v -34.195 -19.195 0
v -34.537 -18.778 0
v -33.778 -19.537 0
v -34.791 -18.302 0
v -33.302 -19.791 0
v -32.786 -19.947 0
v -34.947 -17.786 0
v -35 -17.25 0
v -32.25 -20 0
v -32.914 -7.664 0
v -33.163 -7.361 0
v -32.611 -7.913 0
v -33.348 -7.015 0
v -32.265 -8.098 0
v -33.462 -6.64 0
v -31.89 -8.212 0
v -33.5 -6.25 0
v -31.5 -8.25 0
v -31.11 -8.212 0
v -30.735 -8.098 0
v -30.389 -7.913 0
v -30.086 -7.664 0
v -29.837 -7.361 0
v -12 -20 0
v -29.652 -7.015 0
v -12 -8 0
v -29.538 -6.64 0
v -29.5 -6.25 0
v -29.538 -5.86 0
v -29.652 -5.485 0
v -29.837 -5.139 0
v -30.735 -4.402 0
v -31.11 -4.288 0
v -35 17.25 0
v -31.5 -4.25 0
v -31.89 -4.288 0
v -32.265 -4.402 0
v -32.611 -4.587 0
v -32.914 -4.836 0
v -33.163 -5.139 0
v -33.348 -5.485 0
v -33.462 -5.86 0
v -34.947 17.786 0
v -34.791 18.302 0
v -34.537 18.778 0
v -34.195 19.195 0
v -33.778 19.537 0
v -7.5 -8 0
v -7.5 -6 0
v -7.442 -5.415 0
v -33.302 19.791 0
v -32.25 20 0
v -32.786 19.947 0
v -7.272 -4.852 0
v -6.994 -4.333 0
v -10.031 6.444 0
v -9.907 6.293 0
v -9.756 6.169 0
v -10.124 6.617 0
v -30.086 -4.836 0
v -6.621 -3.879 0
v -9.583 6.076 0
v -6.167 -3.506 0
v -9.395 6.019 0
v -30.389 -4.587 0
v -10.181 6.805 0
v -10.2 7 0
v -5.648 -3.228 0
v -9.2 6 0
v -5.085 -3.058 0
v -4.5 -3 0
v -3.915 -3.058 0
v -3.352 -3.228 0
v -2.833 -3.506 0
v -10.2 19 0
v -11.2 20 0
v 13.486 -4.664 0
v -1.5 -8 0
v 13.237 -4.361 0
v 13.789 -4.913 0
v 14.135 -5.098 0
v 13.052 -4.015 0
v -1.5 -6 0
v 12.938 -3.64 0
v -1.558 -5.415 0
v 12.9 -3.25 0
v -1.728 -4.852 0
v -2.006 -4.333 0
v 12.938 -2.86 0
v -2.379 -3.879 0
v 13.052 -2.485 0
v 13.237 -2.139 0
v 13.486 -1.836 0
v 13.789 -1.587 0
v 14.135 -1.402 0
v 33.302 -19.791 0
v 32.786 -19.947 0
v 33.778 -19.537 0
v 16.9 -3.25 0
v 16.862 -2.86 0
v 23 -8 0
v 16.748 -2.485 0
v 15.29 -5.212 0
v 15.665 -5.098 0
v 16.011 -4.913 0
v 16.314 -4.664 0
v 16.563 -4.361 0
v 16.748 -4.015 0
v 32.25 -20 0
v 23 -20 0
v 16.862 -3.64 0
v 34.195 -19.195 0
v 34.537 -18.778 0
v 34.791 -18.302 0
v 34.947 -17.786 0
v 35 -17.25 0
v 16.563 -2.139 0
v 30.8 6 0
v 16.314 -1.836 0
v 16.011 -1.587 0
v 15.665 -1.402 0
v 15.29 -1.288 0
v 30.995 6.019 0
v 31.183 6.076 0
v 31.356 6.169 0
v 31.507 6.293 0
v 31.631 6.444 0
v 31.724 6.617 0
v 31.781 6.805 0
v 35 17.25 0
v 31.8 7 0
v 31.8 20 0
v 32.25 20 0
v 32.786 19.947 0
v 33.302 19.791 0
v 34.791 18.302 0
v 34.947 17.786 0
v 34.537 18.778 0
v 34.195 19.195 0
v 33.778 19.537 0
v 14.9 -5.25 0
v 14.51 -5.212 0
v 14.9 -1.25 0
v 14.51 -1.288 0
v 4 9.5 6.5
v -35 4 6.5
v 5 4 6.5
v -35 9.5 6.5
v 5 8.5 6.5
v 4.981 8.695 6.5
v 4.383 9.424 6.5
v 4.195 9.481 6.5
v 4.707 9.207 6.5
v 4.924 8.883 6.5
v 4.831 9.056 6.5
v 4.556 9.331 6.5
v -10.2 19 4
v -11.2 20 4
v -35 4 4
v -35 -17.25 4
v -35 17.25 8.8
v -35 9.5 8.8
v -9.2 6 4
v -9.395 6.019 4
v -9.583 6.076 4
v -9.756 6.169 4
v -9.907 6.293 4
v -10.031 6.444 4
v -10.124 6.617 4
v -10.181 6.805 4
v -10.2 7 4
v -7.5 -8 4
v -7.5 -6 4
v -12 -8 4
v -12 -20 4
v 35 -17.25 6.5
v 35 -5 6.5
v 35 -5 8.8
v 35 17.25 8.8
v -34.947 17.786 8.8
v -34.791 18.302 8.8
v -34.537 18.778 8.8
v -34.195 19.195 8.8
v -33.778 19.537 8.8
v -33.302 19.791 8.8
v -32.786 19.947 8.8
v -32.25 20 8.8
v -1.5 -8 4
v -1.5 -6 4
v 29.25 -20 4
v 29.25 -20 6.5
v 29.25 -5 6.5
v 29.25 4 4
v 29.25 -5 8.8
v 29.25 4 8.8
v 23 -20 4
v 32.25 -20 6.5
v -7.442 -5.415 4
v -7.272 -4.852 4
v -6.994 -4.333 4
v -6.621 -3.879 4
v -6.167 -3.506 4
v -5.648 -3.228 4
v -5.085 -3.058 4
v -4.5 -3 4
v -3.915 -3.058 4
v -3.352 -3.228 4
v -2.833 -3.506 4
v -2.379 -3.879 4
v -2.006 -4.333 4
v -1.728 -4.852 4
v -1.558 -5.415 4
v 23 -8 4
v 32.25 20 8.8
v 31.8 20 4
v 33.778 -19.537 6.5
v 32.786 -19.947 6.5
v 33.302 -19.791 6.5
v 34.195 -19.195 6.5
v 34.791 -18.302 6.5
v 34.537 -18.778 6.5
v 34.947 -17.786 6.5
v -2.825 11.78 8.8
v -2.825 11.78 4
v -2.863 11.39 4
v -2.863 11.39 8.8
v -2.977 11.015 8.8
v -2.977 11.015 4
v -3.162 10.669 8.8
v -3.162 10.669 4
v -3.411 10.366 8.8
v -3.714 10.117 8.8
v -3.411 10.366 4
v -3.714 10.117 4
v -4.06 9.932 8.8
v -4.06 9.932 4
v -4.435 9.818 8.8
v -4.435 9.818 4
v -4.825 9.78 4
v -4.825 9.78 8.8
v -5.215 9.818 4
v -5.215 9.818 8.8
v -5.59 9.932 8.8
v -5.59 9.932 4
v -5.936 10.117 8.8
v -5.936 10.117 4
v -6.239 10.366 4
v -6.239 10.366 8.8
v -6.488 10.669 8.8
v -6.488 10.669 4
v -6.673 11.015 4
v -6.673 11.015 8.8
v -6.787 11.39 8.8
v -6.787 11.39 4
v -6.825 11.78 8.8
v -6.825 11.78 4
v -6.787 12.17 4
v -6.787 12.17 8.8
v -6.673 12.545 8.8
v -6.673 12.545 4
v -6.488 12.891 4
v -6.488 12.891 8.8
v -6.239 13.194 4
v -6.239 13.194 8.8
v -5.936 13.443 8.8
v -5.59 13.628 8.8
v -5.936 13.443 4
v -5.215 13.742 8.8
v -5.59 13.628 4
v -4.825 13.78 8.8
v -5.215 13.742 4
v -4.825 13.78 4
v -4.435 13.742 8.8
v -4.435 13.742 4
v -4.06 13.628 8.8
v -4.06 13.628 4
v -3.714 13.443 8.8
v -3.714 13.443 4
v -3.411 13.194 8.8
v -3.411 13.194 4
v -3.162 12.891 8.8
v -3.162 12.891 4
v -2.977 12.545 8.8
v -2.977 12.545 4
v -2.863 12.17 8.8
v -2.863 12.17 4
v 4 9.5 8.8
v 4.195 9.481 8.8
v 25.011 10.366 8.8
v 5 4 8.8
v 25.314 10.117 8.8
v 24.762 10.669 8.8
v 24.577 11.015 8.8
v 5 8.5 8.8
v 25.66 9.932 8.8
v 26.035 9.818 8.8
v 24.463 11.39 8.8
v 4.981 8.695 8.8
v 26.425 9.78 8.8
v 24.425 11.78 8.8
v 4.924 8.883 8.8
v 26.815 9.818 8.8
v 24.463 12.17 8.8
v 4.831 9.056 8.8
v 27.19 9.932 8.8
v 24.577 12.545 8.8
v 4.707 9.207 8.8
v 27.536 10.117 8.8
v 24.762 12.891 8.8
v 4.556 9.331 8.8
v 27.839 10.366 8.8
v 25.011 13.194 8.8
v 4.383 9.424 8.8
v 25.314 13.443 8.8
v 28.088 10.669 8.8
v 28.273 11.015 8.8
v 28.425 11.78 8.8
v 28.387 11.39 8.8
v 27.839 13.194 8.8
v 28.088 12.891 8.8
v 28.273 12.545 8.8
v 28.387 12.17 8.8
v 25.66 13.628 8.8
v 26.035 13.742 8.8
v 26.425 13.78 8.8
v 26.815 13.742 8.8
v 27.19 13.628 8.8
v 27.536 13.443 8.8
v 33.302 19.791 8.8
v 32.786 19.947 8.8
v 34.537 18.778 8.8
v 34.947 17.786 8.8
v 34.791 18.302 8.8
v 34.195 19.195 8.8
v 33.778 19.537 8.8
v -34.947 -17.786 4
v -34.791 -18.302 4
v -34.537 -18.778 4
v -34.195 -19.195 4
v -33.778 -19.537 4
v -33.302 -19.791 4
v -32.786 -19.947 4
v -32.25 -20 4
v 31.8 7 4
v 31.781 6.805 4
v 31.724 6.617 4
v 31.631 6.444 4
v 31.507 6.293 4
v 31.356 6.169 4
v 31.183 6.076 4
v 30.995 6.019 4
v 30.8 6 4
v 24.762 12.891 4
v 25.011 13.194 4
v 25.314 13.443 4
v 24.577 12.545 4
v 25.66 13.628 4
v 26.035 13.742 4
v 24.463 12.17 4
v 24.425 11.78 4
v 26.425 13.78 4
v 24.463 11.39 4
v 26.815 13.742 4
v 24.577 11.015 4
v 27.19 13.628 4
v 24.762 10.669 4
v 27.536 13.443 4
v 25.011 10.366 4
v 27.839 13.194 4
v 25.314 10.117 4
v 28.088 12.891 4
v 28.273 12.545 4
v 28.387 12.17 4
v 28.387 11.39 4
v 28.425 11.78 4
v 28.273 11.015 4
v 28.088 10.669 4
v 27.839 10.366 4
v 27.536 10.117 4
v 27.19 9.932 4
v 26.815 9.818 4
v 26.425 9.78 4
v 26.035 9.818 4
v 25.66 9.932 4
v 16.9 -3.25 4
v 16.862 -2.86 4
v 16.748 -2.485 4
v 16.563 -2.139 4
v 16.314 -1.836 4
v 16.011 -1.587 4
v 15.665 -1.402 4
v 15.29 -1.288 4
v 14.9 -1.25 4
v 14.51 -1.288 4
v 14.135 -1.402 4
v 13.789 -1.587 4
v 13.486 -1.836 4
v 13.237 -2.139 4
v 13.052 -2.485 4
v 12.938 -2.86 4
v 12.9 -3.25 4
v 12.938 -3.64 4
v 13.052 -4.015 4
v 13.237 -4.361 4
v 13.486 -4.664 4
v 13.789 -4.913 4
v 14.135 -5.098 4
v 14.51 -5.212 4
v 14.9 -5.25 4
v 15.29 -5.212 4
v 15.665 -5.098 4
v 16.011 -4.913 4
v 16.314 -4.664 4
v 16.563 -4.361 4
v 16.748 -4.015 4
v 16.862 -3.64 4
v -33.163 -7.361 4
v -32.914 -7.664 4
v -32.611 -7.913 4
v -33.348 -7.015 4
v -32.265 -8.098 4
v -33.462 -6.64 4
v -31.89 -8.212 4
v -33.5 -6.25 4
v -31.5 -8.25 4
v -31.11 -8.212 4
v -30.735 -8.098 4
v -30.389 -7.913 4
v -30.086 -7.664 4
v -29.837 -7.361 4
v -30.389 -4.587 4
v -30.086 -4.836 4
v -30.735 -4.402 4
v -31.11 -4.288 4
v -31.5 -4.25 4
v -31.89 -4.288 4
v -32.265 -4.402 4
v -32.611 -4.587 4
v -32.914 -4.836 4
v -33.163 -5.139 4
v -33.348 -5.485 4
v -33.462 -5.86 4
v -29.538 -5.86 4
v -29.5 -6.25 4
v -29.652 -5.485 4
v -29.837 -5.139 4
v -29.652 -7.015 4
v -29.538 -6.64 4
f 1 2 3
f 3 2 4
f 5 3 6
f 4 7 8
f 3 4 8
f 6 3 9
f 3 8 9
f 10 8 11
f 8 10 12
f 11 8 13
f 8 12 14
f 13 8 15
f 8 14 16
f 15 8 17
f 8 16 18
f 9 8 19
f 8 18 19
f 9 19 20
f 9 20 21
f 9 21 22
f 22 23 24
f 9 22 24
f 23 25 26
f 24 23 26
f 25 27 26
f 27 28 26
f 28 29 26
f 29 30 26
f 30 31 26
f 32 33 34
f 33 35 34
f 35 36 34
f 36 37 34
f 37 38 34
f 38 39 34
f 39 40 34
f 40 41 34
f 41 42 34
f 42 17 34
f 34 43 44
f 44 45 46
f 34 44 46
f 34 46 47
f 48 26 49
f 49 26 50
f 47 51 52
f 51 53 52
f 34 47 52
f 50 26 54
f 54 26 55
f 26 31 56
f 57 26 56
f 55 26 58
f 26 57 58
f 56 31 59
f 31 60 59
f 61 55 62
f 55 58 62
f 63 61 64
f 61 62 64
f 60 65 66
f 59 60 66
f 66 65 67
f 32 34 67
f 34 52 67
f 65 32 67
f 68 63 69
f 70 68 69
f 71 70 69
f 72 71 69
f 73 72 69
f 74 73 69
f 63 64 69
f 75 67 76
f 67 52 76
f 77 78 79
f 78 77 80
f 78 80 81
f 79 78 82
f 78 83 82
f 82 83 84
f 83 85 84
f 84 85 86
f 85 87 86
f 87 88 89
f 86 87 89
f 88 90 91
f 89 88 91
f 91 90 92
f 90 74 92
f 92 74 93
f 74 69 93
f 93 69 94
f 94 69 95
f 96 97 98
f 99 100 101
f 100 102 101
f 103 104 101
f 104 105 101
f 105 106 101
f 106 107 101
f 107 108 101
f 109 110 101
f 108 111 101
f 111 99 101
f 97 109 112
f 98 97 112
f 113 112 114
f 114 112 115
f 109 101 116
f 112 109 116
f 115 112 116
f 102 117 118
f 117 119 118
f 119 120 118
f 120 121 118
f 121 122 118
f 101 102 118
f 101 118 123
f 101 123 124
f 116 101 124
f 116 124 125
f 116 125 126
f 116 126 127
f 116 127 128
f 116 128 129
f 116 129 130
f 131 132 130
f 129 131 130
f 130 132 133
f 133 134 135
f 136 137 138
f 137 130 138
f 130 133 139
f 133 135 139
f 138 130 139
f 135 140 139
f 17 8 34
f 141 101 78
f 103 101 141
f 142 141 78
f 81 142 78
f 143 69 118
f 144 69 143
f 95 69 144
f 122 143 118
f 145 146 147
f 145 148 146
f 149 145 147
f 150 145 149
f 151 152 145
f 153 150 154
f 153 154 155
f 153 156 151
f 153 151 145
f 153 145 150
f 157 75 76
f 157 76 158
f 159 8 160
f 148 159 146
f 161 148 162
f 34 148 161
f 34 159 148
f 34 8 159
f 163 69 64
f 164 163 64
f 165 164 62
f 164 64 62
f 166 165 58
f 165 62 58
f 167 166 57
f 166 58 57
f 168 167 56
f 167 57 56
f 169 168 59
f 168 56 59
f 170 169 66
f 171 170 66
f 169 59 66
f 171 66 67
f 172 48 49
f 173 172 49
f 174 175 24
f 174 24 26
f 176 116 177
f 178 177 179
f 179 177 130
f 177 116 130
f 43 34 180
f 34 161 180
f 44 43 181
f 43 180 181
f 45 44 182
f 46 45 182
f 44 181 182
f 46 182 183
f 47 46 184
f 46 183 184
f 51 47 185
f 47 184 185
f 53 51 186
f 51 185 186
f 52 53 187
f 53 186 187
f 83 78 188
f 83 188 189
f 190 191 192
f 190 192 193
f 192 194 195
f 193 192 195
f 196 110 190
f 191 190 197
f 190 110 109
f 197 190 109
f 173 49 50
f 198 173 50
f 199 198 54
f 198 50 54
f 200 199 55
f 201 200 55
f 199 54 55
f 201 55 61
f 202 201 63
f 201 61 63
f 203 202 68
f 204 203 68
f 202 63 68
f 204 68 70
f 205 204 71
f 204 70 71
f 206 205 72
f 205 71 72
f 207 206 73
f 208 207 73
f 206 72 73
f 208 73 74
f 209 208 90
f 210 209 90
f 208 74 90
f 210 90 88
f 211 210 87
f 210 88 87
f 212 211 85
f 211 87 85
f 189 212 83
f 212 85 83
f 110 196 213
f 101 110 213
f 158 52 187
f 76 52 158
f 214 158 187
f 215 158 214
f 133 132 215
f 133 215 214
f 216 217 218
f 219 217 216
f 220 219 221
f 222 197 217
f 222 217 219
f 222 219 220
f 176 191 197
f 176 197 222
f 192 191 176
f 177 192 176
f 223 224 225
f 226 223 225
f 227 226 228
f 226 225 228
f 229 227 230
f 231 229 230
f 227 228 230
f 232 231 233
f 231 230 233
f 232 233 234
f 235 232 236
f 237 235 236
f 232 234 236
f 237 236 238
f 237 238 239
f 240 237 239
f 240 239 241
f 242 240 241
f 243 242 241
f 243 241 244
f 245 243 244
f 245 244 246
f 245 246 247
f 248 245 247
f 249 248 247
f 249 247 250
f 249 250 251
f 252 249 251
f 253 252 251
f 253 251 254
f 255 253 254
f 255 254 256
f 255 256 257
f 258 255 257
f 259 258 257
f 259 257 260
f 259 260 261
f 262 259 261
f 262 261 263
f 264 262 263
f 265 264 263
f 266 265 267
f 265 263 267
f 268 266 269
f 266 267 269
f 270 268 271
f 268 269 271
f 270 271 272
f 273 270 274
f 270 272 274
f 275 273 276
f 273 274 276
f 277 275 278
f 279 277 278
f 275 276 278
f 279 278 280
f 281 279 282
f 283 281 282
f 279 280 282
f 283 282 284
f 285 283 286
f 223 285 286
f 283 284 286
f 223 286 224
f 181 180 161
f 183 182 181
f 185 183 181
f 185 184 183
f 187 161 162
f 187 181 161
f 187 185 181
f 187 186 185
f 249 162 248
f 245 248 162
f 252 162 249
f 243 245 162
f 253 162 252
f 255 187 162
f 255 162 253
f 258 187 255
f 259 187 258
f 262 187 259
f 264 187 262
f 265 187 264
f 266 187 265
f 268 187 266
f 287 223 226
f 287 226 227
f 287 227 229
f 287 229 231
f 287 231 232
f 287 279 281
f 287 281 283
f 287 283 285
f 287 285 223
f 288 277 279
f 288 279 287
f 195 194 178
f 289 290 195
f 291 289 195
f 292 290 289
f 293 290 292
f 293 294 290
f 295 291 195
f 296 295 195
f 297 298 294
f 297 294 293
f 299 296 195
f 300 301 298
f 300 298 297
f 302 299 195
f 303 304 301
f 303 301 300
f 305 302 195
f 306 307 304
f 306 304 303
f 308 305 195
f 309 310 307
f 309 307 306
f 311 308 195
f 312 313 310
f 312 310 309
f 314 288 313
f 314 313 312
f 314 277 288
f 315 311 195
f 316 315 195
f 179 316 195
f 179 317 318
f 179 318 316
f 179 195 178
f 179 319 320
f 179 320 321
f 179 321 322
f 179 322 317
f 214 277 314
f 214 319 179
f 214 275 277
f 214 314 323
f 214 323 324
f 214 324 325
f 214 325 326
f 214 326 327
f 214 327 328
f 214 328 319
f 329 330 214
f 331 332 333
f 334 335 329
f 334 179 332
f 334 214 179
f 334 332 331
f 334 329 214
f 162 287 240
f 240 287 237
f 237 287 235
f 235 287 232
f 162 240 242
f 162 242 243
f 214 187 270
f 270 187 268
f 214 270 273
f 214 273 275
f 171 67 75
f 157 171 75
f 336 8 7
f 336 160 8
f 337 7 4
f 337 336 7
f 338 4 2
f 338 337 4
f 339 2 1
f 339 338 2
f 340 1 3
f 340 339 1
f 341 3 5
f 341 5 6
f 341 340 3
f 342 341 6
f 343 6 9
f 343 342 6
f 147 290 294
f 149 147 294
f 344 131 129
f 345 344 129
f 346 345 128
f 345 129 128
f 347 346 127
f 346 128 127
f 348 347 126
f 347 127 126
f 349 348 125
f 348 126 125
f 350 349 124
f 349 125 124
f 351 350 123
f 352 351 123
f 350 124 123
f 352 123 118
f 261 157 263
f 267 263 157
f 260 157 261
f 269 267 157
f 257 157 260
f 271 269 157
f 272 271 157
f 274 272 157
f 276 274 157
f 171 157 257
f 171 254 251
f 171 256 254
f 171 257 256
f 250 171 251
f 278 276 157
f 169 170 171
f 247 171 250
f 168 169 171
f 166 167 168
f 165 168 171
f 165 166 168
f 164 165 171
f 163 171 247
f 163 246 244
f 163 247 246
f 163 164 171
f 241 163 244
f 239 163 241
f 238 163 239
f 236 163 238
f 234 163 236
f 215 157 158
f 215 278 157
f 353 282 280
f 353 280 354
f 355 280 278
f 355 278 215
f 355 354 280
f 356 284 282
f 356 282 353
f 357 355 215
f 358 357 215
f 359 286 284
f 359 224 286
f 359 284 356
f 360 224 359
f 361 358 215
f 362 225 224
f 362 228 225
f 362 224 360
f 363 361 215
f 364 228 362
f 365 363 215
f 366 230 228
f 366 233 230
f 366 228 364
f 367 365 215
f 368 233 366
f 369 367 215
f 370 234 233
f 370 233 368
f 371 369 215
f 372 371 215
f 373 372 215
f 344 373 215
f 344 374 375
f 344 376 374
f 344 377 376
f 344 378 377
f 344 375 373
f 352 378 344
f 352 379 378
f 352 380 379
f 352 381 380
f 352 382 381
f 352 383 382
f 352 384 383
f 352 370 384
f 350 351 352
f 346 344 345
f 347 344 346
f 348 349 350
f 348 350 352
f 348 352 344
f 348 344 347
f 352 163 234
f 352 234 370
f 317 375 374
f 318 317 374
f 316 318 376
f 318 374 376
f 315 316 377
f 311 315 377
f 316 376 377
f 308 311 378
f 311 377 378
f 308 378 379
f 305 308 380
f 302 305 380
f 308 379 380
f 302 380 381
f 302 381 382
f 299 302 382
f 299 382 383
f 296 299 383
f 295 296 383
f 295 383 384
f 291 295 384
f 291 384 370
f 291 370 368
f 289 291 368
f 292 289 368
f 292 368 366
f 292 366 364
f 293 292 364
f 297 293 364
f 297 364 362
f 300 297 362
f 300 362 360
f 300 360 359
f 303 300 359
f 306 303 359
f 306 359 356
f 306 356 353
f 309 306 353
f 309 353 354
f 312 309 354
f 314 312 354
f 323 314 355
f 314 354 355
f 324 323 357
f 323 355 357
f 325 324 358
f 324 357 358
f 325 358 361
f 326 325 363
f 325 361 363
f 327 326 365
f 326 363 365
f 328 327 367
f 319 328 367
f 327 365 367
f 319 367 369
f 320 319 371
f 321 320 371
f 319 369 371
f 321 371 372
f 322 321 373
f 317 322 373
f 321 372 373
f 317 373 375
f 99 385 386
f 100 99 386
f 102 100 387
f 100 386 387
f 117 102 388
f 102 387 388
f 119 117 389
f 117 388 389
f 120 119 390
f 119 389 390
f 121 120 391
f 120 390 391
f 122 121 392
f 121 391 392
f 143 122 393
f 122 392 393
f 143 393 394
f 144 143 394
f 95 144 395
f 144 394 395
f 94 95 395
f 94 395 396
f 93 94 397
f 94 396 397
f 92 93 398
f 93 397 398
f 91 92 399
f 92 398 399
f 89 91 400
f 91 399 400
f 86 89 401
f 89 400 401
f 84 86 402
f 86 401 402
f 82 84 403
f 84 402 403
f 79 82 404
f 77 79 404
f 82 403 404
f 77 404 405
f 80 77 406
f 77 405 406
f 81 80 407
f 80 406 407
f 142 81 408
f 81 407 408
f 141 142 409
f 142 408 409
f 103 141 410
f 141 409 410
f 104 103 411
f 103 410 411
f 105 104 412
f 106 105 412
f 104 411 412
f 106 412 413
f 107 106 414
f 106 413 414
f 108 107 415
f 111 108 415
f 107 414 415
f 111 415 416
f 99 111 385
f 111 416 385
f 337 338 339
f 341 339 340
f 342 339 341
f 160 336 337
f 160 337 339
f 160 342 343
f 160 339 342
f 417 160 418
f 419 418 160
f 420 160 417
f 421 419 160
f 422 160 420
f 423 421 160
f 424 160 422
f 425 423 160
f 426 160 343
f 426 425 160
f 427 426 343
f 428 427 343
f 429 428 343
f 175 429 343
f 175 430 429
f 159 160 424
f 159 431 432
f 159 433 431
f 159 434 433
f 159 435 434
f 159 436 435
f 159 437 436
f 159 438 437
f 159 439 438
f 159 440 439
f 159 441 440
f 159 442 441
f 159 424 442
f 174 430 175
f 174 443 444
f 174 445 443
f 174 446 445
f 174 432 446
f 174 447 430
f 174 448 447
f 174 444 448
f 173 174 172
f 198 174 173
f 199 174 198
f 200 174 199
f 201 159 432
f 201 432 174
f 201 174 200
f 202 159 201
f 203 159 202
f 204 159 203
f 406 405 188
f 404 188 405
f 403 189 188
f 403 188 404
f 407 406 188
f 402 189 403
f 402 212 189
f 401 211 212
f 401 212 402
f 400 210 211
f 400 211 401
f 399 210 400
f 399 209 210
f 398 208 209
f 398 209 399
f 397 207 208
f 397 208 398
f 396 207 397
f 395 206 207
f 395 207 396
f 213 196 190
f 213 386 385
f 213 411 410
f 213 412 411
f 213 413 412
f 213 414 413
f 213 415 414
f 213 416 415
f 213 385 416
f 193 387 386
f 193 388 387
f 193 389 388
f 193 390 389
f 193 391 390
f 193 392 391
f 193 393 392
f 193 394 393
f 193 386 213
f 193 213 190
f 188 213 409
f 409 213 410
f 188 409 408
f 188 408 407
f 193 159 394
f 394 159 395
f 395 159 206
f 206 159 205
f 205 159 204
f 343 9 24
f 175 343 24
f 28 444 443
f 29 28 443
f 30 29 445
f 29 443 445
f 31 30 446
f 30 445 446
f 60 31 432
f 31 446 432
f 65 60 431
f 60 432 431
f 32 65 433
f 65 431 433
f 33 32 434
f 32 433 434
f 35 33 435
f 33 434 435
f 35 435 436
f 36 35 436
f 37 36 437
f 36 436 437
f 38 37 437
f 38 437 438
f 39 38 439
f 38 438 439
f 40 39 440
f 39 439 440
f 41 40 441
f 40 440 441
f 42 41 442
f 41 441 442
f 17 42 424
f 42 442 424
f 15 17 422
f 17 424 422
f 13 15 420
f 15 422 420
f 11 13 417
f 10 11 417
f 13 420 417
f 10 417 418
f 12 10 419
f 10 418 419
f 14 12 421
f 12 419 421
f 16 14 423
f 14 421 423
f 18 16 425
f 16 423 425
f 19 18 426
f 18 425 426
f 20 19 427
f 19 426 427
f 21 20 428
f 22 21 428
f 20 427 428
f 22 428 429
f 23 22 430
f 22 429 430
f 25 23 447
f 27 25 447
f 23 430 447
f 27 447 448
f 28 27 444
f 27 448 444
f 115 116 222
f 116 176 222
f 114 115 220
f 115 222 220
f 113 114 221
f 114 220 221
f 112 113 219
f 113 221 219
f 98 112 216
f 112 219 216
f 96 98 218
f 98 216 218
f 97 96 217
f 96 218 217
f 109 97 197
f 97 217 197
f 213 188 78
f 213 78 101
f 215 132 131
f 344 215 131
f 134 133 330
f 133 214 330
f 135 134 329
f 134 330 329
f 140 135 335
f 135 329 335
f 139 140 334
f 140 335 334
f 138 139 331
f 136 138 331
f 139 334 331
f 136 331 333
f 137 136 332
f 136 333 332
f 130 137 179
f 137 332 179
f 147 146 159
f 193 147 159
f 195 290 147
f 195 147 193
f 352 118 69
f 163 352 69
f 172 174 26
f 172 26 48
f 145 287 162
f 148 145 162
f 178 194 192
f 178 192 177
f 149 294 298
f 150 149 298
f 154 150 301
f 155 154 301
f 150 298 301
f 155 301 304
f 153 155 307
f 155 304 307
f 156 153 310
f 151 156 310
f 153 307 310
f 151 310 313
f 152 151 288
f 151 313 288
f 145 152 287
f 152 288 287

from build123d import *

# Parameters (mm, degrees)
SKETCH_W             = 70
SKETCH_H             = 40
PAD_DEPTH            = 8.8
POCKET_DEPTH         = 4
SKETCH002_R          = 2
POCKET001_DEPTH      = 4.801
SKETCH003_W          = 64.25
SKETCH003_H          = 24
POCKET002_DEPTH      = 4.8
SKETCH004_R          = 2
POCKET003_DEPTH      = 4
SKETCH005_W          = 35
SKETCH005_H          = 12
POCKET004_DEPTH      = 4
POCKET005_DEPTH      = 8.801
SKETCH009_W          = 5.75
SKETCH009_H          = 15
POCKET006_DEPTH      = 2.3
FILLET_R             = 2.75
CHAMFER_SIZE         = 1
BODY_PLACEMENT_ANGLE = 90


with BuildPart() as part:
    # Sketch → Pad (new body)
    with BuildSketch(Plane.XZ):
        Rectangle(SKETCH_W, SKETCH_H)
    extrude(amount=PAD_DEPTH)

    # Sketch001 (on Face5 of Pad) → Pocket (cut)
    with BuildSketch(Plane(origin=(0, 0, 0), x_dir=(1, 0, 0), z_dir=(0, 1, 0))):
        with BuildLine():
            Line((31.8, -20), (31.8, -7))
            ThreePointArc((31.8, -7), (31.507107, -6.292893), (30.8, -6))
            Line((30.8, -6), (-9.2, -6))
            ThreePointArc((-9.2, -6), (-9.907107, -6.292893), (-10.2, -7))
            Line((-10.2, -7), (-10.2, -20))
            Line((-10.2, -20), (31.8, -20))
        make_face()
    extrude(amount=-POCKET_DEPTH, mode=Mode.SUBTRACT)

    # Sketch002 (on Face7 of Pocket) → Pocket001 (cut, through all)
    with BuildSketch(Plane(origin=(0, -4, 0), x_dir=(1, 0, 0), z_dir=(0, 1, 0))):
        with Locations((-4.825, -11.78)):
            Circle(SKETCH002_R)
        with Locations((26.425, -11.78)):
            Circle(SKETCH002_R)
    extrude(amount=-POCKET001_DEPTH, mode=Mode.SUBTRACT)

    # Sketch003 (on Face5 of Pocket001) → Pocket002 (cut)
    with BuildSketch(Plane.XZ.offset(8.8)):
        with Locations((-2.875, -8)):
            Rectangle(SKETCH003_W, SKETCH003_H)
    extrude(amount=-POCKET002_DEPTH, mode=Mode.SUBTRACT)

    # Sketch004 (on Face4 of Pocket002) → Pocket003 (cut)
    with BuildSketch(Plane.XZ.offset(4)):
        with Locations((14.9, -3.25)):
            Circle(SKETCH004_R)
        with Locations((-31.5, -6.25)):
            Circle(SKETCH004_R)
    extrude(amount=-POCKET003_DEPTH, mode=Mode.SUBTRACT)

    # Sketch005 (on Face4 of Pocket003) → Pocket004 (cut)
    with BuildSketch(Plane.XZ.offset(4)):
        with Locations((5.5, -14)):
            Rectangle(SKETCH005_W, SKETCH005_H)
    extrude(amount=-POCKET004_DEPTH, mode=Mode.SUBTRACT)

    # Sketch008 (on Face2 of Pocket004) → Pocket005 (cut, through all)
    with BuildSketch(Plane(origin=(0, 0, 0), x_dir=(1, 0, 0), z_dir=(0, 1, 0))):
        with BuildLine():
            ThreePointArc((-7.5, 6), (-4.5, 3), (-1.5, 6))
            Line((-1.5, 8), (-1.5, 6))
            Line((-7.5, 8), (-1.5, 8))
            Line((-7.5, 8), (-7.5, 6))
        make_face()
    extrude(amount=-POCKET005_DEPTH, mode=Mode.SUBTRACT)

    # Sketch009 (on Face6 of Pocket005) → Pocket006 (cut)
    with BuildSketch(Plane.XZ.offset(8.8)):
        with BuildLine():
            Line((-35, 4), (5, 4))
            Line((5, 4), (5, 8.5))
            ThreePointArc((5, 8.5), (4.707107, 9.207107), (4, 9.5))
            Line((4, 9.5), (-35, 9.5))
            Line((-35, 9.5), (-35, 4))
        make_face()
        with Locations((32.125, -12.5)):
            Rectangle(SKETCH009_W, SKETCH009_H)
    extrude(amount=-POCKET006_DEPTH, mode=Mode.SUBTRACT)

    # Fillet
    fillet_edges = [part.edges().sort_by_distance(p)[0] for p in [
        (35, -4.4, 20),
        (-35, -4.4, 20),
        (35, -3.25, -20),
        (-35, -2, -20),
    ]]
    fillet(fillet_edges, radius=FILLET_R)

    # Chamfer
    chamfer_edges = [part.edges().sort_by_distance(p)[0] for p in [
        (-10.2, -2, 20),
    ]]
    chamfer(chamfer_edges, length=CHAMFER_SIZE)


with BuildPart() as part_1:
    # Body placement: moved
    add(part.part.rotate(Axis((0, 0, 0), (-1, 0, 0)), BODY_PLACEMENT_ANGLE))


solid = part_1.part
